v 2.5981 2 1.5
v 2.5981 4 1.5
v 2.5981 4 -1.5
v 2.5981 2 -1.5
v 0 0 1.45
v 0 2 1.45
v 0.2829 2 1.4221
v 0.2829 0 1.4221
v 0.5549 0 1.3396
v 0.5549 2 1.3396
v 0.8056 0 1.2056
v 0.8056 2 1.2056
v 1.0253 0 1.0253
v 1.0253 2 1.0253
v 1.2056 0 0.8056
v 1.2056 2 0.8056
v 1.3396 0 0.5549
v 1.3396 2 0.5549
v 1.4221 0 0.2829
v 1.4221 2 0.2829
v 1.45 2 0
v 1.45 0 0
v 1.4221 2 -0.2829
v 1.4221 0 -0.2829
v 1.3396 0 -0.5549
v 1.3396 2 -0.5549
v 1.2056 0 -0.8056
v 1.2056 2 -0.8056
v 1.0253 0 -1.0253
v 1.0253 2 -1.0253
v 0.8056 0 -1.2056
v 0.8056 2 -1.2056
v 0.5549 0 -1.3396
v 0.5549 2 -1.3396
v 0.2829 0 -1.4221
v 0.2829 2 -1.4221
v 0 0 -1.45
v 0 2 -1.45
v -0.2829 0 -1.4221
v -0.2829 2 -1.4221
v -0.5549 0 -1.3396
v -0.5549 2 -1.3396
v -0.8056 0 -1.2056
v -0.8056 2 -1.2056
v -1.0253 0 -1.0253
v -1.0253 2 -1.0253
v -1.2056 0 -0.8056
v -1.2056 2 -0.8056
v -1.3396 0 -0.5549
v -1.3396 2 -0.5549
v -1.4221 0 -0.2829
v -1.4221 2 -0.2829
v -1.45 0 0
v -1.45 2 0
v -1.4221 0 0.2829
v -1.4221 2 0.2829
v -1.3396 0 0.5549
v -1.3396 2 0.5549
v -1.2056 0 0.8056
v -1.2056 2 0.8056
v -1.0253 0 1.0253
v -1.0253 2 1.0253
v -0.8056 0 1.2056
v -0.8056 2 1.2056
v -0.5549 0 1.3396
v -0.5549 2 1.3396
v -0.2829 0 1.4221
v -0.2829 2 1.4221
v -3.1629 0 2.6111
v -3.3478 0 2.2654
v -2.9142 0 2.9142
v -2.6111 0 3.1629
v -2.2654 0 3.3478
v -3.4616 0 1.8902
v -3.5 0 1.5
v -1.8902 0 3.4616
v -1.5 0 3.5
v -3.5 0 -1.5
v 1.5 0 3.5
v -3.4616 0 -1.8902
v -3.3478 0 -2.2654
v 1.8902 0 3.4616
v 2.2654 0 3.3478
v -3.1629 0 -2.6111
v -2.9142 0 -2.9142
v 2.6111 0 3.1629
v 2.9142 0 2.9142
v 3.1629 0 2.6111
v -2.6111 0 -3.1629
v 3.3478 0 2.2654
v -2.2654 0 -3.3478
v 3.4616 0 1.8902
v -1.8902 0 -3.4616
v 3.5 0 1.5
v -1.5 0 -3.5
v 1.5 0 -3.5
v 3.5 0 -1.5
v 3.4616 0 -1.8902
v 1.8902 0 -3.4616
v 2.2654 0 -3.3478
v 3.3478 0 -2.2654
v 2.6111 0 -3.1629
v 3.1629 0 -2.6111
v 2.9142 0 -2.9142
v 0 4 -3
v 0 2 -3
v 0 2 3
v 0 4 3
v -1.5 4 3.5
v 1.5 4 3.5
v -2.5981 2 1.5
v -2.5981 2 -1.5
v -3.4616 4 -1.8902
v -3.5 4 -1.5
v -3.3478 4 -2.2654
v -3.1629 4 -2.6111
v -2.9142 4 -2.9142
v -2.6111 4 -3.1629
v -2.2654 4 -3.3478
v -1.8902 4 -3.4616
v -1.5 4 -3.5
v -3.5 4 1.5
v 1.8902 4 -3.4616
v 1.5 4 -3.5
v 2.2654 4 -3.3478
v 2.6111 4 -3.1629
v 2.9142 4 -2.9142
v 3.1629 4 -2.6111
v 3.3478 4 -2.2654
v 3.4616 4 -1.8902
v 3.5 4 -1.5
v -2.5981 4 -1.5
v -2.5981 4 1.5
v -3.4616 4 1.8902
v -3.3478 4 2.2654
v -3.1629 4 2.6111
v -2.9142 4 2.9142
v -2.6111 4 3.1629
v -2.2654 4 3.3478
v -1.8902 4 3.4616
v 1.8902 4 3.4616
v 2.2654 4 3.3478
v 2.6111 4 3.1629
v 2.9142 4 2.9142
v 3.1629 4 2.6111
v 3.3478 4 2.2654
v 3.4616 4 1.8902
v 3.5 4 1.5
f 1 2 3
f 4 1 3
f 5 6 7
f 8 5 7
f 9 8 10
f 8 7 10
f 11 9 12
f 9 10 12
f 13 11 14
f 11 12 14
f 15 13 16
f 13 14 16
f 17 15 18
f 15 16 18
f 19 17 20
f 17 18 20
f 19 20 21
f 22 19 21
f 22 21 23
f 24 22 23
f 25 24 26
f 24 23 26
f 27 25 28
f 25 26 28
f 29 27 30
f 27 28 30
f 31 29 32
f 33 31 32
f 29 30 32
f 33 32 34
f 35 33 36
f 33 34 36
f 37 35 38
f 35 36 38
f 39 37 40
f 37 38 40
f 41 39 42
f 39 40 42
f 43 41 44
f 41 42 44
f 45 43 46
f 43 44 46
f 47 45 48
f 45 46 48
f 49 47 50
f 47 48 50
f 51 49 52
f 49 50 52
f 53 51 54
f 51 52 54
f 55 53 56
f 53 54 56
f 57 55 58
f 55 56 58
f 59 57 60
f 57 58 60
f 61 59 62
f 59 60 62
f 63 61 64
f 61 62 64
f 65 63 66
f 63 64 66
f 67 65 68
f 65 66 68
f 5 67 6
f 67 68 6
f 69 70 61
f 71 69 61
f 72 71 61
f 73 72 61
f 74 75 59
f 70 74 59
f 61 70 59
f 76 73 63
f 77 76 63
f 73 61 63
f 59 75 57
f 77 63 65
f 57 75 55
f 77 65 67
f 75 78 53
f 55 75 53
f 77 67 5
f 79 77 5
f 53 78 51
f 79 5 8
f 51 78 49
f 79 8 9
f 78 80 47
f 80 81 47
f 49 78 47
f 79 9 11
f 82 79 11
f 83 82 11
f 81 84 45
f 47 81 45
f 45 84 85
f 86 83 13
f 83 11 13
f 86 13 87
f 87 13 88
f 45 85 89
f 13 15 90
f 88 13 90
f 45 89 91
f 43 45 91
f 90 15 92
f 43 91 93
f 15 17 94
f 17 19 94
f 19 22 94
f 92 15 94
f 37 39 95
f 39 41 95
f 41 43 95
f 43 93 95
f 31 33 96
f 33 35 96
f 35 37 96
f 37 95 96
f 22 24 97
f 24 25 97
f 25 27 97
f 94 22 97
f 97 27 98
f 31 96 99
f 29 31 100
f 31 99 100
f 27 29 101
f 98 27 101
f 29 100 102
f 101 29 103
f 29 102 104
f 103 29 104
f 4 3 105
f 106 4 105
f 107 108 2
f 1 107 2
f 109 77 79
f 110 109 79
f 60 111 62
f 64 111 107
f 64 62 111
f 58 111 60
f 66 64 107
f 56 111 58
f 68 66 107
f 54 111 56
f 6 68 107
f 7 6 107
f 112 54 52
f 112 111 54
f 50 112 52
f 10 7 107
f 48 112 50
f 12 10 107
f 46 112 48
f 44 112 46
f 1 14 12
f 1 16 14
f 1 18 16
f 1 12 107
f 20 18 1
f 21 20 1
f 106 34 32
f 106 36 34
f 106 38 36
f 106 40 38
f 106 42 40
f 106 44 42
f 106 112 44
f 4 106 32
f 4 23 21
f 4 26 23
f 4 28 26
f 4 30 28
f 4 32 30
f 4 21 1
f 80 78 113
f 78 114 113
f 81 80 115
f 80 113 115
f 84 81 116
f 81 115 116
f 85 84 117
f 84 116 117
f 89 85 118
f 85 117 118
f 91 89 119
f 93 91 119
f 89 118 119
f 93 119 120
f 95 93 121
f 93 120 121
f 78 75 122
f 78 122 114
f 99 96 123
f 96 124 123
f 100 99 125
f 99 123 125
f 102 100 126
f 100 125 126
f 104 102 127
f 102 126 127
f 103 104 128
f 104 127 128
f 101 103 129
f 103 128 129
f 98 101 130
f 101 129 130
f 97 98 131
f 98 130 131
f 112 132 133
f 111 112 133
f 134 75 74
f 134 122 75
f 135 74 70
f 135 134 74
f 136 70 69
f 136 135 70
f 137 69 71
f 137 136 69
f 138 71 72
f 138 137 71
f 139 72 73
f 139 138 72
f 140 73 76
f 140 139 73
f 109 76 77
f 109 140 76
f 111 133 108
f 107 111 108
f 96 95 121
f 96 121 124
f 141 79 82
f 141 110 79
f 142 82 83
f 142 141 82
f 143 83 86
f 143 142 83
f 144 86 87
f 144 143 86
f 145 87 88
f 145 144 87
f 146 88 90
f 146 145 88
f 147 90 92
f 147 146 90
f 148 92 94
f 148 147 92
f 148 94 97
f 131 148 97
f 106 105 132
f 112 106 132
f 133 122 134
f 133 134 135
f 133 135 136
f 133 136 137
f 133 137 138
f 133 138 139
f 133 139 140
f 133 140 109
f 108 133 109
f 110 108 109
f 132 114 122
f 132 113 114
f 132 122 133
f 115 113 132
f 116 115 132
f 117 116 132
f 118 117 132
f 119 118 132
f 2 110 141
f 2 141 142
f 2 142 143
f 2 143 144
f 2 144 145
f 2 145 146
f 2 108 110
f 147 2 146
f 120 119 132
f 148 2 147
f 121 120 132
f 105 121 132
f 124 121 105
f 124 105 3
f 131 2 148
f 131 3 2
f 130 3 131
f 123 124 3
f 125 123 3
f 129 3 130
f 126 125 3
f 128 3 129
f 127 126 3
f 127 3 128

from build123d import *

# Parameters (mm, degrees)
SKETCH1_W           = 7
SKETCH1_H           = 7
BOSS_EXTRUDE1_DEPTH = 4
CUT_EXTRUDE1_DEPTH  = 2
SKETCH4_R           = 1.45
CUT_EXTRUDE2_DEPTH  = 2
FILLET1_R           = 2


with BuildPart() as part:
    # Sketch1 → Boss-Extrude1 (new body)
    with BuildSketch(Plane(origin=(0, 0, 0), x_dir=(1, 0, 0), z_dir=(0, 1, 0))):
        Rectangle(SKETCH1_W, SKETCH1_H)
    extrude(amount=BOSS_EXTRUDE1_DEPTH)

    # Sketch2 → Cut-Extrude1 (cut)
    with BuildSketch(Plane(origin=(0, 4, 0), x_dir=(1, 0, 0), z_dir=(0, 1, 0))):
        Polygon((2.598076211, -1.5), (2.598076211, 1.5), (0, 3), (-2.598076211, 1.5), (-2.598076211, -1.5), (0, -3), align=None)
    extrude(amount=-CUT_EXTRUDE1_DEPTH, mode=Mode.SUBTRACT)

    # Sketch4 → Cut-Extrude2 (cut)
    with BuildSketch(Plane(origin=(0, 2, 0), x_dir=(1, 0, 0), z_dir=(0, 1, 0))):
        with Locations(Location((0, 0, 0), (0, 0, 270))):
            Circle(SKETCH4_R)
    extrude(amount=-CUT_EXTRUDE2_DEPTH, mode=Mode.SUBTRACT)

    # Fillet1
    fillet1_edges = [part.edges().sort_by_distance(p)[0] for p in [
        (3.5, 2, 3.5),
        (-3.5, 2, 3.5),
        (-3.5, 2, -3.5),
        (3.5, 2, -3.5),
    ]]
    fillet(fillet1_edges, radius=FILLET1_R)


solid = part.part
